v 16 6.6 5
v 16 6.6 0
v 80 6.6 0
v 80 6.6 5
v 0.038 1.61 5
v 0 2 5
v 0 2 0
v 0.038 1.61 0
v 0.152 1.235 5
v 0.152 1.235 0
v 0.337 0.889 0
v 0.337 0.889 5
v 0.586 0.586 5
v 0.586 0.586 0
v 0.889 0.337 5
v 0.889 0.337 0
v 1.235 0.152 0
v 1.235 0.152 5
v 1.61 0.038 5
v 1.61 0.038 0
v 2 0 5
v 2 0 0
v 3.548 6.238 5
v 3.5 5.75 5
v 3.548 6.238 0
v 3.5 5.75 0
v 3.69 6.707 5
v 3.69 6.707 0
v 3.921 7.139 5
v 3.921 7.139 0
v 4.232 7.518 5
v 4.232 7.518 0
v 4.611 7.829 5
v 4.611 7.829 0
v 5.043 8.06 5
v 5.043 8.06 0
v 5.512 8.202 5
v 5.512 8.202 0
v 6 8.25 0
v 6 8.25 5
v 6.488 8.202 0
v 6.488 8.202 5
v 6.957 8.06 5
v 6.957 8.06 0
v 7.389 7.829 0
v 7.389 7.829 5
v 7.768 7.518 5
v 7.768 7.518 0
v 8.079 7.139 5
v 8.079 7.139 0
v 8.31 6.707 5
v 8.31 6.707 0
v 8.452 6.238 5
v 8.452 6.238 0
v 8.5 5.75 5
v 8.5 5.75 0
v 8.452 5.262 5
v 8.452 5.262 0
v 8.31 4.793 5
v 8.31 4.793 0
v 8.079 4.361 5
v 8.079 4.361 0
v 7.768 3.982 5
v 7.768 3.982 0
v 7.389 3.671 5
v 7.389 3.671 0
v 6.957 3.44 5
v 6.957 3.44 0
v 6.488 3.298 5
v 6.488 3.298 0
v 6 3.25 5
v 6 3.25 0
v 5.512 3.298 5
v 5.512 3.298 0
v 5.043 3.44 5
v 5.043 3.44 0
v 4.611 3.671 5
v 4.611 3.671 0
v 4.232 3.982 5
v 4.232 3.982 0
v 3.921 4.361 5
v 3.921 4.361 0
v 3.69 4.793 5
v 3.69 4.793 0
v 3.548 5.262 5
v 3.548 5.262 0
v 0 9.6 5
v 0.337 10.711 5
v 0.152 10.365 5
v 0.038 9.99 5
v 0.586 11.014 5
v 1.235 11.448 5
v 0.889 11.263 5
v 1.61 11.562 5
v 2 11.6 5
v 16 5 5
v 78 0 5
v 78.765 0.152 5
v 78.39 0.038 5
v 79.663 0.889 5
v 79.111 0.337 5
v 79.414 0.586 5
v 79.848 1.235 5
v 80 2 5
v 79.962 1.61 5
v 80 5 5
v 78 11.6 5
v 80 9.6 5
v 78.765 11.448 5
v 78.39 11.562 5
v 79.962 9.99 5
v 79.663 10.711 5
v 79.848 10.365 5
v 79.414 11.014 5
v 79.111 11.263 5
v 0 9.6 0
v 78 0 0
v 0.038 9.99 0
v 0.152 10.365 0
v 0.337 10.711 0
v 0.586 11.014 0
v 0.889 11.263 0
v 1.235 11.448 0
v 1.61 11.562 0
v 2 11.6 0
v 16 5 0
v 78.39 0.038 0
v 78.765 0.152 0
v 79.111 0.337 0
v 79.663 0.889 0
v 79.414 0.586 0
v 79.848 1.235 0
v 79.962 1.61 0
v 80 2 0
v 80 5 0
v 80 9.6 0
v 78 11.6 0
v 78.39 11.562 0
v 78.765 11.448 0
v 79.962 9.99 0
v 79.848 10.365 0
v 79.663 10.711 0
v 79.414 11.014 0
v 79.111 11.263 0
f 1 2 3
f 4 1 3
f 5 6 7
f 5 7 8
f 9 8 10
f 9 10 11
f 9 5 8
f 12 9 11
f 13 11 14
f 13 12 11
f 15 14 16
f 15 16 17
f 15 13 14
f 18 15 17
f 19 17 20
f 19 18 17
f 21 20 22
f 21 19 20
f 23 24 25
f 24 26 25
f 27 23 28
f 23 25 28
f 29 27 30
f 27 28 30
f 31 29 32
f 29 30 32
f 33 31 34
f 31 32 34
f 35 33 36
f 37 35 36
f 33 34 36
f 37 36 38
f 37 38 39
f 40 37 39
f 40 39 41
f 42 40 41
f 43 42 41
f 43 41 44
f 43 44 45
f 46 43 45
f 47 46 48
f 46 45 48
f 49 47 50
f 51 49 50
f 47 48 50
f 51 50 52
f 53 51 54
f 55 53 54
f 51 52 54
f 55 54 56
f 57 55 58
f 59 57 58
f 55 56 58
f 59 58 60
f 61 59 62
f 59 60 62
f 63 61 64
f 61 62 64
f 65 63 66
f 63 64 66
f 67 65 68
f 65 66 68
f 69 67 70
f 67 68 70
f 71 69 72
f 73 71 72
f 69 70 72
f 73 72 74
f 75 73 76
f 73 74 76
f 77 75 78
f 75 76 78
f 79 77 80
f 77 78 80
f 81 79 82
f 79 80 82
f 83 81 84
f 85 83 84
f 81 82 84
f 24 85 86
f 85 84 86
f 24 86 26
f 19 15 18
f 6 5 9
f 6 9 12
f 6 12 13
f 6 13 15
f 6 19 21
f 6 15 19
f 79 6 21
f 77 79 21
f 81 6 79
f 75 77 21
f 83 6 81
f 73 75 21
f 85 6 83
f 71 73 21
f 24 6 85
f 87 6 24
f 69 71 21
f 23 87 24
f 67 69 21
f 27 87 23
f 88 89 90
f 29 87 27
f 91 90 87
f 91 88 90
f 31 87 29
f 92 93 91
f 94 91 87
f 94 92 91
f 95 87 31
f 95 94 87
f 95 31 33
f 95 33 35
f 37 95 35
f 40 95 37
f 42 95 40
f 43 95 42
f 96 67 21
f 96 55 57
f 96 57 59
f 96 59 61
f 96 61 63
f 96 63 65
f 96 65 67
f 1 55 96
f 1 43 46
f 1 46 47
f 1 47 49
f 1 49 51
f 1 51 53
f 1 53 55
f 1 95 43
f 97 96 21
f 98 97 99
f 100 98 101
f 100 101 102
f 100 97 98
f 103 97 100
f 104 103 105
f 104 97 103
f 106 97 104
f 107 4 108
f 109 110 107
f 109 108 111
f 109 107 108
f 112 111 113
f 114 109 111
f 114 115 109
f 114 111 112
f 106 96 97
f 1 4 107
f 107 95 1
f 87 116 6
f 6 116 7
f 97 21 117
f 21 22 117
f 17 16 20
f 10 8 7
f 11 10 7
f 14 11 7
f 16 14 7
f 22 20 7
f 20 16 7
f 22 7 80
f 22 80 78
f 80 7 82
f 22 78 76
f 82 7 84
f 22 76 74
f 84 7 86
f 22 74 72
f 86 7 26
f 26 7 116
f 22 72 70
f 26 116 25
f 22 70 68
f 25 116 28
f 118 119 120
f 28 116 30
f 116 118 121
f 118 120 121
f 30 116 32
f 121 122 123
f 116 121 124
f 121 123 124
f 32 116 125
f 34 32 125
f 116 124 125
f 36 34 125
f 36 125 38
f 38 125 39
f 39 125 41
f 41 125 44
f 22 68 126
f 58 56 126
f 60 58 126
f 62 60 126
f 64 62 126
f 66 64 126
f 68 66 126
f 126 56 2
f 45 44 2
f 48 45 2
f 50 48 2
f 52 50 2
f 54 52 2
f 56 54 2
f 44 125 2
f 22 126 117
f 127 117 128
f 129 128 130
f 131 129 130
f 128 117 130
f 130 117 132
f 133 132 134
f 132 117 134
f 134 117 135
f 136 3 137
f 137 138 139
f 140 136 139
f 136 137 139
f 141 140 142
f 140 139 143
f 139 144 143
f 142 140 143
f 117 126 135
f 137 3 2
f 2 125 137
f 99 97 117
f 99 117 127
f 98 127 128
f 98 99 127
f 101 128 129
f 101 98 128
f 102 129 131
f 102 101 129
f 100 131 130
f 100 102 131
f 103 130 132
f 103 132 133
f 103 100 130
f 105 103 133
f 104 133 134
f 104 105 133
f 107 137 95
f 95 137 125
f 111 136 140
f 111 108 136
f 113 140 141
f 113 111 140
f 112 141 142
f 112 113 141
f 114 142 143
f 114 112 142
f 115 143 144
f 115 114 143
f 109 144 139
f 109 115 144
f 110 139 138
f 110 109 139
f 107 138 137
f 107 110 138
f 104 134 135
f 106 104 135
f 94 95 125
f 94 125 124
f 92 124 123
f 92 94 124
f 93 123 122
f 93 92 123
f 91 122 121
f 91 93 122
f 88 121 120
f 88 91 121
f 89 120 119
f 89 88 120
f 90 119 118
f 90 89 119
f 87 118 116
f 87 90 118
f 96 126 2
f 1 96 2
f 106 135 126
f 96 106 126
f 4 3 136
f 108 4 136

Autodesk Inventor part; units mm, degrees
ref_plane "YZ Plane" through (0, 0, 0) normal (1, 0, 0) x (0, 1, 0)
ref_plane "XZ Plane" through (0, 0, 0) normal (0, 1, 0) x (-1, 0, 0)
ref_plane "XY Plane" through (0, 0, 0) normal (0, 0, 1) x (1, 0, 0)
sketch "Эскиз1" plane through (0, 0, 0) normal (0, 1, 0) x (-1, 0, 0)
  point P0 (0, 0)
sketch "Эскиз2" plane through (0, 0, 0) normal (0, 0, 1) x (1, 0, 0)
  line L0 (0, 0) -> (80, 0)
  line L1 (80, 0) -> (80, 5)
  line L2 (80, 5) -> (0, 5)
  line L3 (0, 5) -> (0, 0)
  line L4 (0, 5) -> (16, 5)
  line L5 (16, 5) -> (16, 6.6)
  line L6 (16, 6.6) -> (0, 6.6)
  line L7 (0, 6.6) -> (0, 5)
  line L8 (0, 6.6) -> (80, 6.6)
  line L9 (80, 6.6) -> (80, 11.6)
  line L10 (80, 11.6) -> (0, 11.6)
  line L11 (0, 11.6) -> (0, 6.6)
  dimension "d0" = 5
  dimension "d1" = 80
  dimension "d2" = 16
  dimension "d3" = 1.6
  dimension "d4" = 80
  dimension "d5" = 5
extrude "Выдавливание1" add sketch "Эскиз2" along normal blind 5
fillet "Сопряжение1" radius 2 4 edges at (0, 0, 2.5) (0, 11.6, 2.5) (80, 0, 2.5) (80, 11.6, 2.5)
sketch "Эскиз3" plane through (0, 0, 0) normal (0, 0, -1) x (-1, 0, 0)
  circle A0 centre (-6, 5.75) radius 2.5
  line L0 (-16, 5) -> (-16, 6.6) projected
  line L1 (-16, 5.75) -> (-16, 5)
  point P0 (0, 0)
  dimension "d9" = 5
extrude "Выдавливание2" cut sketch "Эскиз3" against normal blind 13.75
properties part number "Bush_phase_mono" material "Медь"
